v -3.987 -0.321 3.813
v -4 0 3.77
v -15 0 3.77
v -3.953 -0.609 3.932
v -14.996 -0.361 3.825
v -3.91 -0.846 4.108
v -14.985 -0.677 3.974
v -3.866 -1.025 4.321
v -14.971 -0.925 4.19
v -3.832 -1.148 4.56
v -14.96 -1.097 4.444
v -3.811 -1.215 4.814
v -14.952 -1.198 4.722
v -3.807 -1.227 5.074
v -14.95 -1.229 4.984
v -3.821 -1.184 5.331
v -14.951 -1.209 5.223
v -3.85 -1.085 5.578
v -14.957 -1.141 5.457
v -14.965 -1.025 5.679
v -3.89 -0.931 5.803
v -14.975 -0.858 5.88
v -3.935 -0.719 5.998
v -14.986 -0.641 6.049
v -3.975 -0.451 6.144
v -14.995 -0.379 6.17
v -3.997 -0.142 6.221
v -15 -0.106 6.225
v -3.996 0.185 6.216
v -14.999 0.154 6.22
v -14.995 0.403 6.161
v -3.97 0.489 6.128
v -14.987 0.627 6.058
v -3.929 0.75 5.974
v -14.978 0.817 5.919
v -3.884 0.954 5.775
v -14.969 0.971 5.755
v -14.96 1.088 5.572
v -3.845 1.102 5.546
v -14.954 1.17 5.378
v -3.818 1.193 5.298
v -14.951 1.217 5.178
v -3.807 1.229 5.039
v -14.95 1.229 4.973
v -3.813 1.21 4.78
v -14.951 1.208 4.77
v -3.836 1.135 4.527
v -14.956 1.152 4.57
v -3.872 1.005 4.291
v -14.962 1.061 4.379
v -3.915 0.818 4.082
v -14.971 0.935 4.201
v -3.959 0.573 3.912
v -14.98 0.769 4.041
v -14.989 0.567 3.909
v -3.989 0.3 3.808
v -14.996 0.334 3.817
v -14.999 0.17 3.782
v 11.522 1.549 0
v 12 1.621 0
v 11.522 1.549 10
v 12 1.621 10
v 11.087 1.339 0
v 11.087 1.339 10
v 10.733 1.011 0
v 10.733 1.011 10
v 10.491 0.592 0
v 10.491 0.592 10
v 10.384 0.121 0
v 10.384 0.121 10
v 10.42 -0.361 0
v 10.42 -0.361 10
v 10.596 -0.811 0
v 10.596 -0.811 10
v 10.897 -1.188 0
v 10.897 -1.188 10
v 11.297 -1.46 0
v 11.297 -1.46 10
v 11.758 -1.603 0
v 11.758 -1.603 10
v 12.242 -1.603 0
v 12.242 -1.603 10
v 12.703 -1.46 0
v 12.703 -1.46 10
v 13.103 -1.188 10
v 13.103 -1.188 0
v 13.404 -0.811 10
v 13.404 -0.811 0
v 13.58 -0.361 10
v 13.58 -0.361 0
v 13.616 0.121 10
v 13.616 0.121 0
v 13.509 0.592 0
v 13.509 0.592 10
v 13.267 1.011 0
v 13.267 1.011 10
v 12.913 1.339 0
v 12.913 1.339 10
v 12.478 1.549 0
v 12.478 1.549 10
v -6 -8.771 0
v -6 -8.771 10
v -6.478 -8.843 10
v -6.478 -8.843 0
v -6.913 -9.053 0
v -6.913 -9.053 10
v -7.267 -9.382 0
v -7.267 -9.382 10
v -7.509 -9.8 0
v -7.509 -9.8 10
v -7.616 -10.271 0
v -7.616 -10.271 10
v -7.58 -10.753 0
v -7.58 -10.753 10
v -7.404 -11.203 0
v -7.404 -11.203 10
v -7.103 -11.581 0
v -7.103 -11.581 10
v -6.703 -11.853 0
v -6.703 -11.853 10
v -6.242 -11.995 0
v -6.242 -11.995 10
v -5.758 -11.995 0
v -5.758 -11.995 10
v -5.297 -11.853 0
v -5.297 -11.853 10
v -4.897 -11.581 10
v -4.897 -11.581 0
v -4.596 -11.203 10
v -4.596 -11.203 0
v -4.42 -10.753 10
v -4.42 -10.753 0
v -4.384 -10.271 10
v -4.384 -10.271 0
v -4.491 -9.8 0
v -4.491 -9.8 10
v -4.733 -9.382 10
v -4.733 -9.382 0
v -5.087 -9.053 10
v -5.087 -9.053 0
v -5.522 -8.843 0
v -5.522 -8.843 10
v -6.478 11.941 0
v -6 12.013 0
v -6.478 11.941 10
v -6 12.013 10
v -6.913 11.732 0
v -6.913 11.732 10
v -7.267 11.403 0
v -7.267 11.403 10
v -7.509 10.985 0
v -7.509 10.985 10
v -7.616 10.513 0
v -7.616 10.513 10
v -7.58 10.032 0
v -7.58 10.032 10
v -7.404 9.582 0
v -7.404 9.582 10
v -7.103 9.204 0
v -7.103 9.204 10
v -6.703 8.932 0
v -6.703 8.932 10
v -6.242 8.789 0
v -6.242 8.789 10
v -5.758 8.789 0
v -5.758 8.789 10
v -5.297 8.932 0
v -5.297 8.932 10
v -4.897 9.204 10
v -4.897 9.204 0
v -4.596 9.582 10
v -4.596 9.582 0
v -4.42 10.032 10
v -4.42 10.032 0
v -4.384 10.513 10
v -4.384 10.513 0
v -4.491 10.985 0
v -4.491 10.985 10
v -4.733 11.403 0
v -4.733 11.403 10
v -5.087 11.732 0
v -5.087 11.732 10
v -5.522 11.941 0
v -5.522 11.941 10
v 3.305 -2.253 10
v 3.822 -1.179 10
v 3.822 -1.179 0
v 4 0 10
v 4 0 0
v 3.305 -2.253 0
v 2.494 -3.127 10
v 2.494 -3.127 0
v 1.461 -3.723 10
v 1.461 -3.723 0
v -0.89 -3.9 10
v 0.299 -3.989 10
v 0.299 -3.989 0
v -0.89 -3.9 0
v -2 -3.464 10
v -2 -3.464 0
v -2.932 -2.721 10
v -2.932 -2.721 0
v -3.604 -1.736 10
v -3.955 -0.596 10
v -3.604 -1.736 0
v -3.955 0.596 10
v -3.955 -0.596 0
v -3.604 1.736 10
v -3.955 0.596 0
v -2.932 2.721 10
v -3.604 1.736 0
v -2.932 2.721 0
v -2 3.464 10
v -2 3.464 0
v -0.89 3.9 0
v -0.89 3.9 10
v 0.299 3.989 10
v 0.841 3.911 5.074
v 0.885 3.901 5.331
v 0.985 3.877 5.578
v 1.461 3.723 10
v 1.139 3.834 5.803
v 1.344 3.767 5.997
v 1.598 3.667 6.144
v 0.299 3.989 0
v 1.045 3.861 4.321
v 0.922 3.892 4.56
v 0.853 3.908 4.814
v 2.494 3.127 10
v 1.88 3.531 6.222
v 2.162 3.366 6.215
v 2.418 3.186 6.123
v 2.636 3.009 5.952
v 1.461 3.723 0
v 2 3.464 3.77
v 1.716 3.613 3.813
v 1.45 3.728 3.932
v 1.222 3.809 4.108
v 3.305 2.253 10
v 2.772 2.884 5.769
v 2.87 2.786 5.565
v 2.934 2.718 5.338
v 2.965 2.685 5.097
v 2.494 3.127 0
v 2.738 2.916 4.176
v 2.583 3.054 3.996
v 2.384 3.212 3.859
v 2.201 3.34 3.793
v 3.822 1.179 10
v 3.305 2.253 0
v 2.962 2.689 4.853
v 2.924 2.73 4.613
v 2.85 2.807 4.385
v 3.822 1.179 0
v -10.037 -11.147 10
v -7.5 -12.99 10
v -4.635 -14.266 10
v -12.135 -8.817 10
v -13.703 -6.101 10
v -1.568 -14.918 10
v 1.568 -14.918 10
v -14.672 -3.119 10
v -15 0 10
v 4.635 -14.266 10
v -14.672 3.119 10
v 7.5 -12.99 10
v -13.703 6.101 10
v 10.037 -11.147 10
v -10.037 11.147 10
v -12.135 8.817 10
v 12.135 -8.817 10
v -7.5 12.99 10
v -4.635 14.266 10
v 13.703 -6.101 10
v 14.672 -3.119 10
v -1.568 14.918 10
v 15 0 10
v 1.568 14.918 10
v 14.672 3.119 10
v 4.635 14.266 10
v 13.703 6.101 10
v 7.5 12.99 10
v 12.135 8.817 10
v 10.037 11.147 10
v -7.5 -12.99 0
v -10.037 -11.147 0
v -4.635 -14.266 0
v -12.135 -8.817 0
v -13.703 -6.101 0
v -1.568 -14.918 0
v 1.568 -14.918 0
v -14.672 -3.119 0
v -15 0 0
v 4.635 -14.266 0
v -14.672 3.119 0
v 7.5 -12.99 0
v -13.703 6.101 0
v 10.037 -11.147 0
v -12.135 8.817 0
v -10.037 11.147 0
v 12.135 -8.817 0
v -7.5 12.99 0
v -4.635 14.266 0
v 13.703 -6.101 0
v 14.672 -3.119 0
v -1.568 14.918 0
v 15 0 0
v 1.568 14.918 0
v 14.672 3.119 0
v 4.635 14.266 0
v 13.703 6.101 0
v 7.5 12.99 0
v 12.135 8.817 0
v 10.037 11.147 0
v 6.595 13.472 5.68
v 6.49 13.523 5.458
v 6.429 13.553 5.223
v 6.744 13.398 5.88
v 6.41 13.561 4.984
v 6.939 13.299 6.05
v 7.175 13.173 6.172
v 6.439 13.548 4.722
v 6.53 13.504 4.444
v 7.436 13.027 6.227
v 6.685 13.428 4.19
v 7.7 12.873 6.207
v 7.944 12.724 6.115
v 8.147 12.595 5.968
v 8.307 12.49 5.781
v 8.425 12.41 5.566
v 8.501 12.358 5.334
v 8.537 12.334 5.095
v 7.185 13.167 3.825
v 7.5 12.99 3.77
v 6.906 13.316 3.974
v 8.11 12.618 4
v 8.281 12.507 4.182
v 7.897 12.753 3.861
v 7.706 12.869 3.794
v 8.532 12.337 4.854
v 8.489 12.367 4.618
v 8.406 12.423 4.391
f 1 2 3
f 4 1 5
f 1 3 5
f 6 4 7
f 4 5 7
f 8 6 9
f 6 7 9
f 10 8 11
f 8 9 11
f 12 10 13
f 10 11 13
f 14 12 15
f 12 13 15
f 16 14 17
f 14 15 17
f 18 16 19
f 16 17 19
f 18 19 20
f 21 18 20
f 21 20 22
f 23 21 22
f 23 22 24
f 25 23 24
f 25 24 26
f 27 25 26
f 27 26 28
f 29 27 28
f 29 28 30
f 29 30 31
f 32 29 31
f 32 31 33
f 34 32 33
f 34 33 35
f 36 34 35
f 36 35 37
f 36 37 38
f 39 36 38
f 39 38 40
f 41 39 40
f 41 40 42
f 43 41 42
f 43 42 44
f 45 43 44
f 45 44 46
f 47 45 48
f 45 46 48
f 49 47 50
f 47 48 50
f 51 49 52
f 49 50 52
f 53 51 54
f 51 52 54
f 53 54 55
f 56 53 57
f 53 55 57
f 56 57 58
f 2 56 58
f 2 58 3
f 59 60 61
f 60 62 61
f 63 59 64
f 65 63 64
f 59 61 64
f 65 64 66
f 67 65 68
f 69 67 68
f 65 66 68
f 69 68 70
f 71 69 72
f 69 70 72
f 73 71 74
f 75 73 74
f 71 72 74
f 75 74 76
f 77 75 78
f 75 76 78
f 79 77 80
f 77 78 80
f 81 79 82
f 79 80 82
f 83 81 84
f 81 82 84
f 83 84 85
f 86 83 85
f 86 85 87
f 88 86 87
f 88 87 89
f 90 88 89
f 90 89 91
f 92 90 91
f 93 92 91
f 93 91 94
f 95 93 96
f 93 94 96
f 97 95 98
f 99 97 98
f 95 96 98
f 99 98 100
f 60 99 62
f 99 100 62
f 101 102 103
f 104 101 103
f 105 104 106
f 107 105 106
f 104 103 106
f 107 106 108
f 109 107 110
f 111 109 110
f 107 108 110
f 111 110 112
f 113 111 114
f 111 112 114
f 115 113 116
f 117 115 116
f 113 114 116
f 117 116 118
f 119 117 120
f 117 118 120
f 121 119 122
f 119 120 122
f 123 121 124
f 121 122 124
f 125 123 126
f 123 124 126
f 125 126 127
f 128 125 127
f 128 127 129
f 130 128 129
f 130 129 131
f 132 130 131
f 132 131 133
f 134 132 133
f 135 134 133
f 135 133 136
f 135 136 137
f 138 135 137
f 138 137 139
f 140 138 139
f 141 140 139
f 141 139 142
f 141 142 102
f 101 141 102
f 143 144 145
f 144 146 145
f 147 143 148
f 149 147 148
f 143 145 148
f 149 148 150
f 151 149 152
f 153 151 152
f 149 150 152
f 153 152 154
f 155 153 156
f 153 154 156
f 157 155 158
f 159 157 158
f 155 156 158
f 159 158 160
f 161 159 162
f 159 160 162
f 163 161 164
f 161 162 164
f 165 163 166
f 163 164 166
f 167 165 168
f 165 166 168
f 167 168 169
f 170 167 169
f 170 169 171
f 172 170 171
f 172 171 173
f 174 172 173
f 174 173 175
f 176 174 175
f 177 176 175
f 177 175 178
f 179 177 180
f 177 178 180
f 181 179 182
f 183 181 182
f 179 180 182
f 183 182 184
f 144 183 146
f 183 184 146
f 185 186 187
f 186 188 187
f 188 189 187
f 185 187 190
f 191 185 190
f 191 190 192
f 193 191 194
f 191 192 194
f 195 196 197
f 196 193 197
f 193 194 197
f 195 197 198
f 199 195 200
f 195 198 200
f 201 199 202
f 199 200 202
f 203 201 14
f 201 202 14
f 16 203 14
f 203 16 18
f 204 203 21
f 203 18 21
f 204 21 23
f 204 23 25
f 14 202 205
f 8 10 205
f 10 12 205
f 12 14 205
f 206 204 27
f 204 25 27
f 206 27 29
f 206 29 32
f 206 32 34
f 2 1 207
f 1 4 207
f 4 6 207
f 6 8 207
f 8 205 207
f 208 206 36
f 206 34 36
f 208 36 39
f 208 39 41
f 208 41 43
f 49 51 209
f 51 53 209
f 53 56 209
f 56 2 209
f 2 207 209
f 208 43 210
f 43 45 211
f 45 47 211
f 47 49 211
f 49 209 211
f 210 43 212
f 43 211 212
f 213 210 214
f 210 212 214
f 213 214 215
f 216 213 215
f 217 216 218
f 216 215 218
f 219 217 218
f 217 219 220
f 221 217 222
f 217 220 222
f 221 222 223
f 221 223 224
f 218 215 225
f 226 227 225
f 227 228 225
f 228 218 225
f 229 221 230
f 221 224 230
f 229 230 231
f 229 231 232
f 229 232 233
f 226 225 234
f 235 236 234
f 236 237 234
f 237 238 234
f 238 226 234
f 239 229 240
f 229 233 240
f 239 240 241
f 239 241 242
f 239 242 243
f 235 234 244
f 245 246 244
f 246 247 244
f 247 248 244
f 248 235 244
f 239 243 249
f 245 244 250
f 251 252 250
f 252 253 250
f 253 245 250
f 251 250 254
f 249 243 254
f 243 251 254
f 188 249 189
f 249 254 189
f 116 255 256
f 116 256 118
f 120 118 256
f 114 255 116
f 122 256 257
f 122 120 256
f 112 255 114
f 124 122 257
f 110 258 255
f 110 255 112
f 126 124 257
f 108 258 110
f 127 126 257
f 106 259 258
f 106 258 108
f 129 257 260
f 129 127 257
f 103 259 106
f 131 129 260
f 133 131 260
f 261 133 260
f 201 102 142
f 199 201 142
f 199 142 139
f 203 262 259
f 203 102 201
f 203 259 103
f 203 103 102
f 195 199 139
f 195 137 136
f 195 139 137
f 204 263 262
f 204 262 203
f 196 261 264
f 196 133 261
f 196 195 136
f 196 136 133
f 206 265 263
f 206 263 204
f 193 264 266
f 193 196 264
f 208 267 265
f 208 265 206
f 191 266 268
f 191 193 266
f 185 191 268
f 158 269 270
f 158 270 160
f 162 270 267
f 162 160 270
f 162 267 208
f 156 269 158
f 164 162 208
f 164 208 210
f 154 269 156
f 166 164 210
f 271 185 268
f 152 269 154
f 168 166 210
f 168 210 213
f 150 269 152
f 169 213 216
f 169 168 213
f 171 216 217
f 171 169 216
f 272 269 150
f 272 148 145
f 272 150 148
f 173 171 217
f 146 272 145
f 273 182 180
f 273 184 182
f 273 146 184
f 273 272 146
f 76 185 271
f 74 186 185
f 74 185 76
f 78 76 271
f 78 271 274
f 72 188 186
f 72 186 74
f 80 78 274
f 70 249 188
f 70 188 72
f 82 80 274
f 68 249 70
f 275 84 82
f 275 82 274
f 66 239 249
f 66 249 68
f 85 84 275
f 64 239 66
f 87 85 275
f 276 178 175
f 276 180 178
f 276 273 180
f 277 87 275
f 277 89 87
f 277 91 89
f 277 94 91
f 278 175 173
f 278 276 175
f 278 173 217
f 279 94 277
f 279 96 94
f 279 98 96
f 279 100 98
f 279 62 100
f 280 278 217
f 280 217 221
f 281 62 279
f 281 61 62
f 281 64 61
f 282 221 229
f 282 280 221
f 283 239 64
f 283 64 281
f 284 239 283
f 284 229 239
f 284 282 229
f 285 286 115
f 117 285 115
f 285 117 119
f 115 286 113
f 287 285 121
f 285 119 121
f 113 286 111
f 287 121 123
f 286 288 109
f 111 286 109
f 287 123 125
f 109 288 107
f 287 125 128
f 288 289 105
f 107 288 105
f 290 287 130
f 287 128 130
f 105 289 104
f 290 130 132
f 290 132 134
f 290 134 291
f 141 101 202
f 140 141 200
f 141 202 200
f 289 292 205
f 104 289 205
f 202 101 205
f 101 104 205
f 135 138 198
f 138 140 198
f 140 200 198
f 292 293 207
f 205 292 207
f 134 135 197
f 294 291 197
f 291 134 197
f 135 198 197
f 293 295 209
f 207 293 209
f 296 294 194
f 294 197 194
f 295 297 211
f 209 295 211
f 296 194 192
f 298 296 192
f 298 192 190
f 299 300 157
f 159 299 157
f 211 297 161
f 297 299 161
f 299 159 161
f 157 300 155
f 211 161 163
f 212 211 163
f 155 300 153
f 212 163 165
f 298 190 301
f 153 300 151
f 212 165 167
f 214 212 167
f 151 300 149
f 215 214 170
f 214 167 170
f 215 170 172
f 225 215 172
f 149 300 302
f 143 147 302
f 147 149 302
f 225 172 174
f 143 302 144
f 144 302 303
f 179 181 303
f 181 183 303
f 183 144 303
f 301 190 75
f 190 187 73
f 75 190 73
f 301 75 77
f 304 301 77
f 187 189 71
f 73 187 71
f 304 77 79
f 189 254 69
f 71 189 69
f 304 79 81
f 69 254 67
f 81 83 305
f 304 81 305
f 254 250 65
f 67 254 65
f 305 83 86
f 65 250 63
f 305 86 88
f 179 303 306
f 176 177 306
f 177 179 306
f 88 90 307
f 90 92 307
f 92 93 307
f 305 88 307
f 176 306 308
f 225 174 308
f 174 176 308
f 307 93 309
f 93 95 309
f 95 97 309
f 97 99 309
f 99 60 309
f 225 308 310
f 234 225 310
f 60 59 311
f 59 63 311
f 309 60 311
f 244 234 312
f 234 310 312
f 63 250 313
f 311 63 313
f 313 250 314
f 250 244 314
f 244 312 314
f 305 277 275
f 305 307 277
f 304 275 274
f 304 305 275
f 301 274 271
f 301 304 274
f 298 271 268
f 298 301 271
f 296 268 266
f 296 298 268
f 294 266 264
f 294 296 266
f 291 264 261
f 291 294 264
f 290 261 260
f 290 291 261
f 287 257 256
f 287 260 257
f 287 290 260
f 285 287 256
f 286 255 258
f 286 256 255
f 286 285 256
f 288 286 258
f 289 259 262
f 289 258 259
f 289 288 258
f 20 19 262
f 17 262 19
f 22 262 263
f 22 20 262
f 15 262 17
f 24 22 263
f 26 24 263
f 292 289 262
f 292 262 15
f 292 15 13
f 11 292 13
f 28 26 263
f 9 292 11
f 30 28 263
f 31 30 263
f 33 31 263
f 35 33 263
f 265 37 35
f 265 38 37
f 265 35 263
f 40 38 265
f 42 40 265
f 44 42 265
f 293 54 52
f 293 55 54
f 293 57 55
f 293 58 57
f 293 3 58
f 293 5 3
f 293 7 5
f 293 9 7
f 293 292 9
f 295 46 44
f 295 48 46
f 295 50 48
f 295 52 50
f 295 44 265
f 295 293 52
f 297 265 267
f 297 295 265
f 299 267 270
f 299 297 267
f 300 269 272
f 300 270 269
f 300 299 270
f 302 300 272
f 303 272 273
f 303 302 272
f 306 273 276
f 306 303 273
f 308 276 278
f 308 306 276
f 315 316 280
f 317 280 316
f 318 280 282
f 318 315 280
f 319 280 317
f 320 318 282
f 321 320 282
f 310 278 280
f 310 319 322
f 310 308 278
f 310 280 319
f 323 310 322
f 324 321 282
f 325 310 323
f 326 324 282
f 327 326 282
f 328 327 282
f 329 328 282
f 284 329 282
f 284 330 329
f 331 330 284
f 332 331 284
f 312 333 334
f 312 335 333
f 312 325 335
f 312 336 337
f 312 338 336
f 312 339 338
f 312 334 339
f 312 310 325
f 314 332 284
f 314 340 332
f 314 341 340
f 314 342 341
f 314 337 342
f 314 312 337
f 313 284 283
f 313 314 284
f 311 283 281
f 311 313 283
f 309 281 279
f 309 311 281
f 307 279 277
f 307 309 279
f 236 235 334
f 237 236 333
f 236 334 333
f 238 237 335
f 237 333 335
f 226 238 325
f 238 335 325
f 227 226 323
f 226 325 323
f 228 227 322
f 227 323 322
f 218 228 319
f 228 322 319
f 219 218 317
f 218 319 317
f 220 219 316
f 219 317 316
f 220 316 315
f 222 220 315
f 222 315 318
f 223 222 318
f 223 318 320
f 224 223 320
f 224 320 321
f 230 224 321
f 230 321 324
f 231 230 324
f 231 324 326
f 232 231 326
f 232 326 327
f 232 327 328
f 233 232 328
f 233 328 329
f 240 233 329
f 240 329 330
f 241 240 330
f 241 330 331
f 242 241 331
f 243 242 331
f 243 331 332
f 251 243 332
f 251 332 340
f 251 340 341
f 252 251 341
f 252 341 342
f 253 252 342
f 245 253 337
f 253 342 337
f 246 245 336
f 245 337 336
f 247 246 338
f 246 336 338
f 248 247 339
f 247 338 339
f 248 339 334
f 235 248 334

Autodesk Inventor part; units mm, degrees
ref_plane "YZ Plane" through (0, 0, 0) normal (1, 0, 0) x (0, 1, 0)
ref_plane "XY Plane" through (0, 0, 0) normal (0, 0, 1) x (1, 0, 0)
sketch "Sketch1" plane through (0, 0, 0) normal (0, 0, 1) x (1, 0, 0)
  circle A0 centre (0, 0) radius 15
  circle A1 centre (0, 0) radius 4
  point P0 (12, 0)
  point P1 (-6, 10.3923)
  point P2 (-6, -10.3923)
  dimension "d0" = 30
  dimension "d1" = 12
  dimension "d2" = 8
  dimension "d5" = 360
extrude "Plate1" add sketch "Sketch1" along normal blind 10
hole "Hole1" at (12, 0, 0) at (-6, 10.3923, 0) at (-6, -10.3923, 0) direction (0, 0, 1) diameter 3.242 depth 15 tip angle 118 thread size "M4x0.7" class "6H" standard "ISO Metric profile"
sketch "Sketch2" plane through (0, 0, 0) normal (1, 0, 0) x (0, 1, 0)
  line L0 (4, 0) -> (-4, 0) projected
  point P0 (0, 0)
  point P1 (0, 5)
  dimension "d15" = 5
hole "Hole2" at (0, 0, 5) direction (-1, 0, 0) diameter 2.459 end through all thread size "M3x0.5" class "6H" standard "ISO Metric profile"
ref_plane "Work Plane1" through (0, 0, 0) normal (-0.5, -0.866, 0) x (0, 0, 1)
sketch "Sketch3" plane through (0, 0, 0) normal (-0.5, -0.866, 0) x (0, 0, 1)
  point P0 (0, 0)
  point P1 (5, 3.9111)
  point P2 (5, 0)
  dimension "d24" = 5
hole "Hole3" at (0, 0, 5) direction (0.5, 0.866, 0) diameter 2.459 end through all thread size "M3x0.5" class "6H" standard "ISO Metric profile"
equation "\"d7\" = Thickness"
equation "\"BendReliefDepth\" = 0.5 * Thickness"
equation "\"Thickness\" = 10"
properties part number "asmountAs4" material "Aluminum 6061"
